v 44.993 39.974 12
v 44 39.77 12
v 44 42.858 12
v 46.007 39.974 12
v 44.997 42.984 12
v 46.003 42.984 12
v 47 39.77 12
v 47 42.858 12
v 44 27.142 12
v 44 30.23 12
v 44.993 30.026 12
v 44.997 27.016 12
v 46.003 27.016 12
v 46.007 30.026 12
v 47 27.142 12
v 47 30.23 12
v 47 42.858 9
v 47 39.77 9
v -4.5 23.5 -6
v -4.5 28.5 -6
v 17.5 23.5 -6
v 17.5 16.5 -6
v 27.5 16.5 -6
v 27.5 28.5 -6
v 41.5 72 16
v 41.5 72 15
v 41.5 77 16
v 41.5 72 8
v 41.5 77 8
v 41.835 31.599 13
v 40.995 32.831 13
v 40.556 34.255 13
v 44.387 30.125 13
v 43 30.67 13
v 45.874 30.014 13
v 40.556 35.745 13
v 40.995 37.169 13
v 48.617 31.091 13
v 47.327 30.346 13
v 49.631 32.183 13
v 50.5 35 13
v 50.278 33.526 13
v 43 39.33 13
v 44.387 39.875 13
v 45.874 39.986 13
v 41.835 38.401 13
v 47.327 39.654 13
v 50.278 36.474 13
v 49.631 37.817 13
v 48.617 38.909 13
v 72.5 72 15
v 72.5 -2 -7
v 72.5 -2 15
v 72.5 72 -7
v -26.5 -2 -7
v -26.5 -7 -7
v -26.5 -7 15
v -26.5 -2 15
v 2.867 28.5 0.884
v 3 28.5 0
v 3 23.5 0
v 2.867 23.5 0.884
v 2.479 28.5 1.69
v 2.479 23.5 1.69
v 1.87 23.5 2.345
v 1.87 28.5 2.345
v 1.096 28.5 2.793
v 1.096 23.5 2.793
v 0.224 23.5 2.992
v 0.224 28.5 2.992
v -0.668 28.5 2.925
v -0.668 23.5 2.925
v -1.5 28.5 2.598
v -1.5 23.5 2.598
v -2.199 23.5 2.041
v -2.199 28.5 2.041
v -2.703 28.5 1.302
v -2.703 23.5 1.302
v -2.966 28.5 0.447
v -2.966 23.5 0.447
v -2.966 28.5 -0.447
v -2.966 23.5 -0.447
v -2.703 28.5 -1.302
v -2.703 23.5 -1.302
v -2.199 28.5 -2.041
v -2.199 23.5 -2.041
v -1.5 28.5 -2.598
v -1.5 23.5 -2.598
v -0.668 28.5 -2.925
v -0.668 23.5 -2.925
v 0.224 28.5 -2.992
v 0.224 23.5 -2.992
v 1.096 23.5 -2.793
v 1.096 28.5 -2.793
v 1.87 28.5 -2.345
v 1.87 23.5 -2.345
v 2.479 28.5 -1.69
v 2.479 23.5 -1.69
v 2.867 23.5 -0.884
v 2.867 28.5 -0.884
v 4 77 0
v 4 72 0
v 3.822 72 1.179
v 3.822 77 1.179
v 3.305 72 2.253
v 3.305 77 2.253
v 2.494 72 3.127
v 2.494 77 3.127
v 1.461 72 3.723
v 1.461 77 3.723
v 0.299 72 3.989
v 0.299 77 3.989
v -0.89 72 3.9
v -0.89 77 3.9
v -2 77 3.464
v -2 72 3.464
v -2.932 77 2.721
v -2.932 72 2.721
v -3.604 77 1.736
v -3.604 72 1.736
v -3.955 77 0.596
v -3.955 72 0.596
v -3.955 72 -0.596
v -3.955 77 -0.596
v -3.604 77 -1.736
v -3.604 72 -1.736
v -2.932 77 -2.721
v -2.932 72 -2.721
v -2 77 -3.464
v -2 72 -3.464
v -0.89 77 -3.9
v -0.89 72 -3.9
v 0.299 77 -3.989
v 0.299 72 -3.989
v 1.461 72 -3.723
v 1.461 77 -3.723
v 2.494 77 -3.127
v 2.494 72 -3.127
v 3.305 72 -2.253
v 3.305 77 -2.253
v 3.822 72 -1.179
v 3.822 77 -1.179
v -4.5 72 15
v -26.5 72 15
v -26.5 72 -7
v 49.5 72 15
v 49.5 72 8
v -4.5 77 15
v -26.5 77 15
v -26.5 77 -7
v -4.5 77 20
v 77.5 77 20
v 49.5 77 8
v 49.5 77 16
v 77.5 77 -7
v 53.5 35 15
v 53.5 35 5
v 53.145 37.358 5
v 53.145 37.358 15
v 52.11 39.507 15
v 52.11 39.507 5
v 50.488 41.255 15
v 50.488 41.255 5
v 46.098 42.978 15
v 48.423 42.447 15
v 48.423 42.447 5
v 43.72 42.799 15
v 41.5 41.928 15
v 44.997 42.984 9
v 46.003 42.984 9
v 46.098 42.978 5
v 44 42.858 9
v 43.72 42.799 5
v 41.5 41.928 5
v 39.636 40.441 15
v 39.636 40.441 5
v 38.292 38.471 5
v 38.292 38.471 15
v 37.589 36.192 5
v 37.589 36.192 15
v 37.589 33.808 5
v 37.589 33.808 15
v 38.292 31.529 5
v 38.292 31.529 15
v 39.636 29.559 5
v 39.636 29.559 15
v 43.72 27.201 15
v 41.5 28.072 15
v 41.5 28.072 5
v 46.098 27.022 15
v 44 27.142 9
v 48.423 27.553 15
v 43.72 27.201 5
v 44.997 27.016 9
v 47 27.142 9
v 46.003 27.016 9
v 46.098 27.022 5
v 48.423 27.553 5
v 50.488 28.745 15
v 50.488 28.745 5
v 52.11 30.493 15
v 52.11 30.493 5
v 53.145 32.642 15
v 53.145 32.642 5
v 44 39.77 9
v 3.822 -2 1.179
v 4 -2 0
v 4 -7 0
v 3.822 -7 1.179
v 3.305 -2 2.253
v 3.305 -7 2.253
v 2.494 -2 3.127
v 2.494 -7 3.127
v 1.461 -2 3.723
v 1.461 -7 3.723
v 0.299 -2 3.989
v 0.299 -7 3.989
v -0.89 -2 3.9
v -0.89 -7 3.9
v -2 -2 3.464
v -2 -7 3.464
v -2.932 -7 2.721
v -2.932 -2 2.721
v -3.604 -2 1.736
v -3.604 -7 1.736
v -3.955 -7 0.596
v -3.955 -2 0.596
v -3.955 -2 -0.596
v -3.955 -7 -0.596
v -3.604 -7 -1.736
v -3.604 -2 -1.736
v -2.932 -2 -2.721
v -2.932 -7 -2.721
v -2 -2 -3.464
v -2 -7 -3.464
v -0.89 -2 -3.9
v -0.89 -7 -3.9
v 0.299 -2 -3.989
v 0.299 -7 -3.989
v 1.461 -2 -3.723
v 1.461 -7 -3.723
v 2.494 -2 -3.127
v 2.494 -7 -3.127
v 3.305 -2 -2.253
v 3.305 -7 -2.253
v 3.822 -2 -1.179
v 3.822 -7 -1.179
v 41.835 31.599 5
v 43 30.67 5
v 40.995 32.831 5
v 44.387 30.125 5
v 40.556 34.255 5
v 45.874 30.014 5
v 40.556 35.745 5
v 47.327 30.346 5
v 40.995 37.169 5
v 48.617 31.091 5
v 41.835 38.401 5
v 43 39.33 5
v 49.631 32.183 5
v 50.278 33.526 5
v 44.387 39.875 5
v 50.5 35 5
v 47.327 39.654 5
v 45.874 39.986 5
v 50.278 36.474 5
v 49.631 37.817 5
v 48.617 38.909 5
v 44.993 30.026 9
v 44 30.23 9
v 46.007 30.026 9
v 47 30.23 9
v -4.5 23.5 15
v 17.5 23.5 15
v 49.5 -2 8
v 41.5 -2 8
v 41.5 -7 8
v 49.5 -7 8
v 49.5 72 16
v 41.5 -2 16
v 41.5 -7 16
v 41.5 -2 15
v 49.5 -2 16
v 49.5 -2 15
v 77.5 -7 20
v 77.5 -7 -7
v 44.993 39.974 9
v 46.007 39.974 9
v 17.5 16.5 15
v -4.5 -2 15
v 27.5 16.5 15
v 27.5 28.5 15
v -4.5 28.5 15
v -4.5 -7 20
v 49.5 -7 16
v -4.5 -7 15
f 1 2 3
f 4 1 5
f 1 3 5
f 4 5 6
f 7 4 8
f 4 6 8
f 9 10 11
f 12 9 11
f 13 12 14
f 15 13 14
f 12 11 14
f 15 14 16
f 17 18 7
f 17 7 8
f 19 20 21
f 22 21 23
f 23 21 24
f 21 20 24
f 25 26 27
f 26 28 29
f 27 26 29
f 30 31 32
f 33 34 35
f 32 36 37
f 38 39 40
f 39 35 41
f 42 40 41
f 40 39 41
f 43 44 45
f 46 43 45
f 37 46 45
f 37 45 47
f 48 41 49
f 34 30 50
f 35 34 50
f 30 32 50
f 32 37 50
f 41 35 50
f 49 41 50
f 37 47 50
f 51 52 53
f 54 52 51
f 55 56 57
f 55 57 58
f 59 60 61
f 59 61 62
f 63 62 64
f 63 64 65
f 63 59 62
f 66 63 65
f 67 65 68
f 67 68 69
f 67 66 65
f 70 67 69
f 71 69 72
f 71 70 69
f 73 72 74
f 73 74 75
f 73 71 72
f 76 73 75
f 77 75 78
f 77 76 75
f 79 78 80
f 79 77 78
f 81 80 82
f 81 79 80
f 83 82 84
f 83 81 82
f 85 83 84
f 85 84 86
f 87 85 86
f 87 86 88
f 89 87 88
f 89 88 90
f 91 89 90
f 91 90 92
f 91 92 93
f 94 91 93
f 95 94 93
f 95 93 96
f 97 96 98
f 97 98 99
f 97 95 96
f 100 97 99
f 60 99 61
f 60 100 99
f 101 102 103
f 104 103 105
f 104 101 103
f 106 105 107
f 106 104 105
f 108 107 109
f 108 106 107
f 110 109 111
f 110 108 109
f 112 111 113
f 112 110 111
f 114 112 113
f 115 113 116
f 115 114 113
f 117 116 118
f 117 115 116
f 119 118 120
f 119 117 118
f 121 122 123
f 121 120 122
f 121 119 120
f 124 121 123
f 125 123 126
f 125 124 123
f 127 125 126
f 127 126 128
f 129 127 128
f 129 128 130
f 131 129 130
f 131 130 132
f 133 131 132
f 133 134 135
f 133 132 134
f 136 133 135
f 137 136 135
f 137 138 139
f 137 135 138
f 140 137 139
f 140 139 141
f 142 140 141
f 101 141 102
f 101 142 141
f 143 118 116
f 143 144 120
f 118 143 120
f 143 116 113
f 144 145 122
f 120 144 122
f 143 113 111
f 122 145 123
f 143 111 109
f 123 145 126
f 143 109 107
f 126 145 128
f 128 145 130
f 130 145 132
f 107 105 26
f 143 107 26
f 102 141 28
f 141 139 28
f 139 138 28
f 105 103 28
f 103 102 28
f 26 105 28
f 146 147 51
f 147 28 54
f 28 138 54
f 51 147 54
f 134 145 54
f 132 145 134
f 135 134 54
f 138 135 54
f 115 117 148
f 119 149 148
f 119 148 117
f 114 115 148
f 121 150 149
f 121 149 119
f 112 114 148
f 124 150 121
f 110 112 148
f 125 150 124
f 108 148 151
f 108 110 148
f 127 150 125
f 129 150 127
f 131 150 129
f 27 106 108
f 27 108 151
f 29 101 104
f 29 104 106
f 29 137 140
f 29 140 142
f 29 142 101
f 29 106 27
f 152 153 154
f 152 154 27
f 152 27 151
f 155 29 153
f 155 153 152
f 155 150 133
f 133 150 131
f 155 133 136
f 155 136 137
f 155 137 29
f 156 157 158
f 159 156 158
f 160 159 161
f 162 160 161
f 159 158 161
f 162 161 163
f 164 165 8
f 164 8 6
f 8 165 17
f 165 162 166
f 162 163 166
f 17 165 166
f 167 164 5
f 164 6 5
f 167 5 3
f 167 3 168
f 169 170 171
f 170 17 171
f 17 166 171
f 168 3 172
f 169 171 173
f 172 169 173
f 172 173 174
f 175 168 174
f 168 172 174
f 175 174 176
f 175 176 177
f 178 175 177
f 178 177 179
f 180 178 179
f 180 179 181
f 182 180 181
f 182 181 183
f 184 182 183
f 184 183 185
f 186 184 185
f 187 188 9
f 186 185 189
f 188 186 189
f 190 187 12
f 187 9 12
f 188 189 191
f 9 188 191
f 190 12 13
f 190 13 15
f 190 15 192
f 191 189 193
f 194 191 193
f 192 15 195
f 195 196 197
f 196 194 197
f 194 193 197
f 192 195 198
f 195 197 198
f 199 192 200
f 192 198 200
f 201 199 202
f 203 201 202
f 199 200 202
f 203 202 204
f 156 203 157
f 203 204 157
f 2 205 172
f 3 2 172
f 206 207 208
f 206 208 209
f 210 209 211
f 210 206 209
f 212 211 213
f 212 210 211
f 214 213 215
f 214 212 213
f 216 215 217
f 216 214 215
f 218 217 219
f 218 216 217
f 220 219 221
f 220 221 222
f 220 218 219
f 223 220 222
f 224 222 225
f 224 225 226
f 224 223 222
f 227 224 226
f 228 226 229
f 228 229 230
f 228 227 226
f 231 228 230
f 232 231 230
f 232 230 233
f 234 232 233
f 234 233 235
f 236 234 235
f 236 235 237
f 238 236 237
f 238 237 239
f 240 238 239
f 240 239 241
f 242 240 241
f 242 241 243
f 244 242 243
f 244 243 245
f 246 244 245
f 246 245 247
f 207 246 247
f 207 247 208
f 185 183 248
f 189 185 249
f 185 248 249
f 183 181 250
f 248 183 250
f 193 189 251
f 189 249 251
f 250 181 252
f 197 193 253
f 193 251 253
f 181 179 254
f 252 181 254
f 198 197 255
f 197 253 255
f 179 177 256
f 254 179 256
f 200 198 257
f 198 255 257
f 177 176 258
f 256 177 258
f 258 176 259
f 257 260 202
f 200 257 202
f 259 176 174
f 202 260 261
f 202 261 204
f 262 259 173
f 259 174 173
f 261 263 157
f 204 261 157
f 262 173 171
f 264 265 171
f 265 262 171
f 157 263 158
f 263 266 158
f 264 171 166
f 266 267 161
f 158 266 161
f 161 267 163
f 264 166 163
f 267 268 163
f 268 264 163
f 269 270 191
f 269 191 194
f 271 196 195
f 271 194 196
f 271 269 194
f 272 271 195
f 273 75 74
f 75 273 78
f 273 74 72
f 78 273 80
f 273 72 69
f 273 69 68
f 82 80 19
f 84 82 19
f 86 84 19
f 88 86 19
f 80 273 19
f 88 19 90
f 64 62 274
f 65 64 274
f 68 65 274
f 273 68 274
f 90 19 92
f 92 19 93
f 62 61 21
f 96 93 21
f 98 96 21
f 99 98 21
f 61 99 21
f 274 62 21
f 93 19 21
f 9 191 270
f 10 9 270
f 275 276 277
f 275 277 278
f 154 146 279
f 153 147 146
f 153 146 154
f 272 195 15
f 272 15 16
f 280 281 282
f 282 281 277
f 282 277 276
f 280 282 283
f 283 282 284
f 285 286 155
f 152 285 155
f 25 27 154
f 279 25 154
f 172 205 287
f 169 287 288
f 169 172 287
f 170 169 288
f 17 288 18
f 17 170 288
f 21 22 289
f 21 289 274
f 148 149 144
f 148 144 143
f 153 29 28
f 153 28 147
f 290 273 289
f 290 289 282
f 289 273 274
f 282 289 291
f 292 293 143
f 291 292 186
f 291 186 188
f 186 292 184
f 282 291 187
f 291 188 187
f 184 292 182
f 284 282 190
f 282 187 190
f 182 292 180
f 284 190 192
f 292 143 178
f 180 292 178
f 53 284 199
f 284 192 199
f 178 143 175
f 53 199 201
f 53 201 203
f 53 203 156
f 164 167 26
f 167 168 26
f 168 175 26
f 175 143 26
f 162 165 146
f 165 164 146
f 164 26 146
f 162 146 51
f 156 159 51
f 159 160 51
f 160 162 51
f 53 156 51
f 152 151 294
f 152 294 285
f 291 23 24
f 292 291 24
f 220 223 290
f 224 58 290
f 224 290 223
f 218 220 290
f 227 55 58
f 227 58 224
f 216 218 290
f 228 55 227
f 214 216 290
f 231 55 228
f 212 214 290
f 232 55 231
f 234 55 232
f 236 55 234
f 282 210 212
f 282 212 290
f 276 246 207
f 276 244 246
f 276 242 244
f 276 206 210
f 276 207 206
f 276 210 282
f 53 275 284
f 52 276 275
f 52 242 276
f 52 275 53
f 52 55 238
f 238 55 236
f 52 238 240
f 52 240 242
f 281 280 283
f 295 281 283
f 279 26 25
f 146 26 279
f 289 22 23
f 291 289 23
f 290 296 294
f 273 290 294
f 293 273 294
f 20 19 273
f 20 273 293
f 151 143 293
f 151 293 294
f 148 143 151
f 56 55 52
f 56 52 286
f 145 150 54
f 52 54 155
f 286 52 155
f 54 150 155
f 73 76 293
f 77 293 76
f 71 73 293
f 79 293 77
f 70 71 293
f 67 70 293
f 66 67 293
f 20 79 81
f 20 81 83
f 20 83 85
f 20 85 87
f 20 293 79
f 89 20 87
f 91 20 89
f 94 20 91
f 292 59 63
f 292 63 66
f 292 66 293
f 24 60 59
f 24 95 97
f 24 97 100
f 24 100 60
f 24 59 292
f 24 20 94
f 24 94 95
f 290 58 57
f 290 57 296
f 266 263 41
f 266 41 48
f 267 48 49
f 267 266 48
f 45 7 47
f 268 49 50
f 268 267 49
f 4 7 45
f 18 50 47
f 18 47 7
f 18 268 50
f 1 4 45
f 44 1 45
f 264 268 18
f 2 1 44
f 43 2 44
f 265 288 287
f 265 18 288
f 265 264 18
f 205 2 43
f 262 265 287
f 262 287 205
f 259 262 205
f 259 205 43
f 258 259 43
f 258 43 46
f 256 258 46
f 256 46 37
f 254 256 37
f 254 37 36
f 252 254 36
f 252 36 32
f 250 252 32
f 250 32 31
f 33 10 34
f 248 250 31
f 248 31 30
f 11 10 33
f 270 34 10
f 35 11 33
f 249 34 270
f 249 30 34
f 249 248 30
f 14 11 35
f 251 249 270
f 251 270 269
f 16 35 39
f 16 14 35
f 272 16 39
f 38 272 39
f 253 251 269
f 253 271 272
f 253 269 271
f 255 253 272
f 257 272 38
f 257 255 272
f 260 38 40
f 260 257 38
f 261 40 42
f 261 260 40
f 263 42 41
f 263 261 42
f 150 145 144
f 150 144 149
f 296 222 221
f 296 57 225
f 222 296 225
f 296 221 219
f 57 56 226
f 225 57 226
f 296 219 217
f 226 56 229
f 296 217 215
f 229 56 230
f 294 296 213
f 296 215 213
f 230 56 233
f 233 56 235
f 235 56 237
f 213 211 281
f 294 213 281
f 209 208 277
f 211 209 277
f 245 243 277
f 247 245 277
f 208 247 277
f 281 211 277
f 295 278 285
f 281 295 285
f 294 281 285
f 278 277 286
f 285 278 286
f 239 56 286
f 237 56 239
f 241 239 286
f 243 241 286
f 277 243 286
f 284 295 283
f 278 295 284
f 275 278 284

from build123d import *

# Parameters (mm, degrees)
CYLINDER003_R     = 3
CYLINDER003_DEPTH = 5
BOX006_W          = 22
BOX006_H          = 5
BOX006_DEPTH      = 21
BOX007_W          = 10
BOX007_H          = 12
BOX007_DEPTH      = 21
CYLINDER007_R     = 5
CYLINDER007_DEPTH = 8
BOX010_W          = 3
BOX010_H          = 16
BOX010_DEPTH      = 3
CYLINDER006_R     = 8
CYLINDER006_DEPTH = 10
CYLINDER001_R     = 4
CYLINDER001_DEPTH = 84
BOX017_W          = 8
BOX017_H          = 5
BOX017_DEPTH      = 8
BOX018_W          = 8
BOX018_H          = 5
BOX018_DEPTH      = 8
BOX019_W          = 22
BOX019_H          = 84
BOX019_DEPTH      = 5
BOX003_W          = 99
BOX003_H          = 74
BOX003_DEPTH      = 29
BOX002_W          = 104
BOX002_H          = 84
BOX002_DEPTH      = 27


with BuildPart() as pivotmountinghole:
    # Cylinder003 → Cylinder003 (new body)
    with BuildSketch(Plane(origin=(19.5, 28.5, 14), x_dir=(1, 0, 0), z_dir=(0, -1, 0))):
        Circle(CYLINDER003_R)
    extrude(amount=CYLINDER003_DEPTH)


with BuildPart() as pivotplate:
    # Box006 → Box006 (new body)
    with BuildSketch(Plane(origin=(15, 23.5, 8), x_dir=(1, 0, 0), z_dir=(0, 0, 1))):
        with Locations((11, 2.5)):
            Rectangle(BOX006_W, BOX006_H)
    extrude(amount=BOX006_DEPTH)


with BuildPart() as pivotmount:
    # Box007 → Box007 (new body)
    with BuildSketch(Plane(origin=(37, 16.5, 8), x_dir=(1, 0, 0), z_dir=(0, 0, 1))):
        with Locations((5, 6)):
            Rectangle(BOX007_W, BOX007_H)
    extrude(amount=BOX007_DEPTH)

    # Fusion003: union PivotPlate
    add(pivotplate.part)

    # Cut003: cut PivotMountingHole
    add(pivotmountinghole.part, mode=Mode.SUBTRACT)


with BuildPart() as topspringholeinner:
    # Cylinder007 → Cylinder007 (new body)
    with BuildSketch(Plane(origin=(65, 35, 19), x_dir=(1, 0, 0), z_dir=(0, 0, 1))):
        Circle(CYLINDER007_R)
    extrude(amount=CYLINDER007_DEPTH)


with BuildPart() as topspringholecutout:
    # Box010 → Box010 (new body)
    with BuildSketch(Plane(origin=(63.5, 27, 23), x_dir=(1, 0, 0), z_dir=(0, 0, 1))):
        with Locations((1.5, 8)):
            Rectangle(BOX010_W, BOX010_H)
    extrude(amount=BOX010_DEPTH)

    # Fusion005: union TopSpringHoleInner
    add(topspringholeinner.part)


with BuildPart() as topspringcaptive:
    # Cylinder006 → Cylinder006 (new body)
    with BuildSketch(Plane(origin=(65, 35, 19), x_dir=(1, 0, 0), z_dir=(0, 0, 1))):
        Circle(CYLINDER006_R)
    extrude(amount=CYLINDER006_DEPTH)

    # Cut005: cut TopSpringHoleCutout
    add(topspringholecutout.part, mode=Mode.SUBTRACT)


with BuildPart() as pivotaxistop:
    # Cylinder001 → Cylinder001 (new body)
    with BuildSketch(Plane(origin=(19.5, 77, 14), x_dir=(1, 0, 0), z_dir=(0, -1, 0))):
        Circle(CYLINDER001_R)
    extrude(amount=CYLINDER001_DEPTH)


with BuildPart() as topspringsplitpinhole1:
    # Box017 → Box017 (new body)
    with BuildSketch(Plane(origin=(61, 72, 22), x_dir=(1, 0, 0), z_dir=(0, 0, 1))):
        with Locations((4, 2.5)):
            Rectangle(BOX017_W, BOX017_H)
    extrude(amount=BOX017_DEPTH)


with BuildPart() as topspringsplitpinhole2:
    # Box018 → Box018 (new body)
    with BuildSketch(Plane(origin=(61, -7, 22), x_dir=(1, 0, 0), z_dir=(0, 0, 1))):
        with Locations((4, 2.5)):
            Rectangle(BOX018_W, BOX018_H)
    extrude(amount=BOX018_DEPTH)


with BuildPart() as toppedalhingecutout:
    # Box019 → Box019 (new body)
    with BuildSketch(Plane(origin=(-7, -7, 29), x_dir=(1, 0, 0), z_dir=(0, 0, 1))):
        with Locations((11, 42)):
            Rectangle(BOX019_W, BOX019_H)
    extrude(amount=BOX019_DEPTH)


with BuildPart() as toppedalcutout:
    # Box003 → Box003 (new body)
    with BuildSketch(Plane(origin=(-7, -2, 0), x_dir=(1, 0, 0), z_dir=(0, 0, 1))):
        with Locations((49.5, 37)):
            Rectangle(BOX003_W, BOX003_H)
    extrude(amount=BOX003_DEPTH)

    # Fusion001: union PivotAxisTop, TopSpringSplitPinHole1, TopSpringSplitPinHole2, TopPedalHingeCutout
    add(pivotaxistop.part)
    add(topspringsplitpinhole1.part)
    add(topspringsplitpinhole2.part)
    add(toppedalhingecutout.part)


with BuildPart() as toppedalprerotate:
    # Box002 → Box002 (new body)
    with BuildSketch(Plane(origin=(-7, -7, 7), x_dir=(1, 0, 0), z_dir=(0, 0, 1))):
        with Locations((52, 42)):
            Rectangle(BOX002_W, BOX002_H)
    extrude(amount=BOX002_DEPTH)

    # Cut001: cut TopPedalCutout
    add(toppedalcutout.part, mode=Mode.SUBTRACT)

    # Fusion006: union PivotMount, TopSpringCaptive
    add(pivotmount.part)
    add(topspringcaptive.part)


with BuildPart() as toppedalprerotate_1:
    # Fusion006 placement: moved
    add(toppedalprerotate.part.moved(Location((-19.5, 0, -14))))


solid = toppedalprerotate_1.part
